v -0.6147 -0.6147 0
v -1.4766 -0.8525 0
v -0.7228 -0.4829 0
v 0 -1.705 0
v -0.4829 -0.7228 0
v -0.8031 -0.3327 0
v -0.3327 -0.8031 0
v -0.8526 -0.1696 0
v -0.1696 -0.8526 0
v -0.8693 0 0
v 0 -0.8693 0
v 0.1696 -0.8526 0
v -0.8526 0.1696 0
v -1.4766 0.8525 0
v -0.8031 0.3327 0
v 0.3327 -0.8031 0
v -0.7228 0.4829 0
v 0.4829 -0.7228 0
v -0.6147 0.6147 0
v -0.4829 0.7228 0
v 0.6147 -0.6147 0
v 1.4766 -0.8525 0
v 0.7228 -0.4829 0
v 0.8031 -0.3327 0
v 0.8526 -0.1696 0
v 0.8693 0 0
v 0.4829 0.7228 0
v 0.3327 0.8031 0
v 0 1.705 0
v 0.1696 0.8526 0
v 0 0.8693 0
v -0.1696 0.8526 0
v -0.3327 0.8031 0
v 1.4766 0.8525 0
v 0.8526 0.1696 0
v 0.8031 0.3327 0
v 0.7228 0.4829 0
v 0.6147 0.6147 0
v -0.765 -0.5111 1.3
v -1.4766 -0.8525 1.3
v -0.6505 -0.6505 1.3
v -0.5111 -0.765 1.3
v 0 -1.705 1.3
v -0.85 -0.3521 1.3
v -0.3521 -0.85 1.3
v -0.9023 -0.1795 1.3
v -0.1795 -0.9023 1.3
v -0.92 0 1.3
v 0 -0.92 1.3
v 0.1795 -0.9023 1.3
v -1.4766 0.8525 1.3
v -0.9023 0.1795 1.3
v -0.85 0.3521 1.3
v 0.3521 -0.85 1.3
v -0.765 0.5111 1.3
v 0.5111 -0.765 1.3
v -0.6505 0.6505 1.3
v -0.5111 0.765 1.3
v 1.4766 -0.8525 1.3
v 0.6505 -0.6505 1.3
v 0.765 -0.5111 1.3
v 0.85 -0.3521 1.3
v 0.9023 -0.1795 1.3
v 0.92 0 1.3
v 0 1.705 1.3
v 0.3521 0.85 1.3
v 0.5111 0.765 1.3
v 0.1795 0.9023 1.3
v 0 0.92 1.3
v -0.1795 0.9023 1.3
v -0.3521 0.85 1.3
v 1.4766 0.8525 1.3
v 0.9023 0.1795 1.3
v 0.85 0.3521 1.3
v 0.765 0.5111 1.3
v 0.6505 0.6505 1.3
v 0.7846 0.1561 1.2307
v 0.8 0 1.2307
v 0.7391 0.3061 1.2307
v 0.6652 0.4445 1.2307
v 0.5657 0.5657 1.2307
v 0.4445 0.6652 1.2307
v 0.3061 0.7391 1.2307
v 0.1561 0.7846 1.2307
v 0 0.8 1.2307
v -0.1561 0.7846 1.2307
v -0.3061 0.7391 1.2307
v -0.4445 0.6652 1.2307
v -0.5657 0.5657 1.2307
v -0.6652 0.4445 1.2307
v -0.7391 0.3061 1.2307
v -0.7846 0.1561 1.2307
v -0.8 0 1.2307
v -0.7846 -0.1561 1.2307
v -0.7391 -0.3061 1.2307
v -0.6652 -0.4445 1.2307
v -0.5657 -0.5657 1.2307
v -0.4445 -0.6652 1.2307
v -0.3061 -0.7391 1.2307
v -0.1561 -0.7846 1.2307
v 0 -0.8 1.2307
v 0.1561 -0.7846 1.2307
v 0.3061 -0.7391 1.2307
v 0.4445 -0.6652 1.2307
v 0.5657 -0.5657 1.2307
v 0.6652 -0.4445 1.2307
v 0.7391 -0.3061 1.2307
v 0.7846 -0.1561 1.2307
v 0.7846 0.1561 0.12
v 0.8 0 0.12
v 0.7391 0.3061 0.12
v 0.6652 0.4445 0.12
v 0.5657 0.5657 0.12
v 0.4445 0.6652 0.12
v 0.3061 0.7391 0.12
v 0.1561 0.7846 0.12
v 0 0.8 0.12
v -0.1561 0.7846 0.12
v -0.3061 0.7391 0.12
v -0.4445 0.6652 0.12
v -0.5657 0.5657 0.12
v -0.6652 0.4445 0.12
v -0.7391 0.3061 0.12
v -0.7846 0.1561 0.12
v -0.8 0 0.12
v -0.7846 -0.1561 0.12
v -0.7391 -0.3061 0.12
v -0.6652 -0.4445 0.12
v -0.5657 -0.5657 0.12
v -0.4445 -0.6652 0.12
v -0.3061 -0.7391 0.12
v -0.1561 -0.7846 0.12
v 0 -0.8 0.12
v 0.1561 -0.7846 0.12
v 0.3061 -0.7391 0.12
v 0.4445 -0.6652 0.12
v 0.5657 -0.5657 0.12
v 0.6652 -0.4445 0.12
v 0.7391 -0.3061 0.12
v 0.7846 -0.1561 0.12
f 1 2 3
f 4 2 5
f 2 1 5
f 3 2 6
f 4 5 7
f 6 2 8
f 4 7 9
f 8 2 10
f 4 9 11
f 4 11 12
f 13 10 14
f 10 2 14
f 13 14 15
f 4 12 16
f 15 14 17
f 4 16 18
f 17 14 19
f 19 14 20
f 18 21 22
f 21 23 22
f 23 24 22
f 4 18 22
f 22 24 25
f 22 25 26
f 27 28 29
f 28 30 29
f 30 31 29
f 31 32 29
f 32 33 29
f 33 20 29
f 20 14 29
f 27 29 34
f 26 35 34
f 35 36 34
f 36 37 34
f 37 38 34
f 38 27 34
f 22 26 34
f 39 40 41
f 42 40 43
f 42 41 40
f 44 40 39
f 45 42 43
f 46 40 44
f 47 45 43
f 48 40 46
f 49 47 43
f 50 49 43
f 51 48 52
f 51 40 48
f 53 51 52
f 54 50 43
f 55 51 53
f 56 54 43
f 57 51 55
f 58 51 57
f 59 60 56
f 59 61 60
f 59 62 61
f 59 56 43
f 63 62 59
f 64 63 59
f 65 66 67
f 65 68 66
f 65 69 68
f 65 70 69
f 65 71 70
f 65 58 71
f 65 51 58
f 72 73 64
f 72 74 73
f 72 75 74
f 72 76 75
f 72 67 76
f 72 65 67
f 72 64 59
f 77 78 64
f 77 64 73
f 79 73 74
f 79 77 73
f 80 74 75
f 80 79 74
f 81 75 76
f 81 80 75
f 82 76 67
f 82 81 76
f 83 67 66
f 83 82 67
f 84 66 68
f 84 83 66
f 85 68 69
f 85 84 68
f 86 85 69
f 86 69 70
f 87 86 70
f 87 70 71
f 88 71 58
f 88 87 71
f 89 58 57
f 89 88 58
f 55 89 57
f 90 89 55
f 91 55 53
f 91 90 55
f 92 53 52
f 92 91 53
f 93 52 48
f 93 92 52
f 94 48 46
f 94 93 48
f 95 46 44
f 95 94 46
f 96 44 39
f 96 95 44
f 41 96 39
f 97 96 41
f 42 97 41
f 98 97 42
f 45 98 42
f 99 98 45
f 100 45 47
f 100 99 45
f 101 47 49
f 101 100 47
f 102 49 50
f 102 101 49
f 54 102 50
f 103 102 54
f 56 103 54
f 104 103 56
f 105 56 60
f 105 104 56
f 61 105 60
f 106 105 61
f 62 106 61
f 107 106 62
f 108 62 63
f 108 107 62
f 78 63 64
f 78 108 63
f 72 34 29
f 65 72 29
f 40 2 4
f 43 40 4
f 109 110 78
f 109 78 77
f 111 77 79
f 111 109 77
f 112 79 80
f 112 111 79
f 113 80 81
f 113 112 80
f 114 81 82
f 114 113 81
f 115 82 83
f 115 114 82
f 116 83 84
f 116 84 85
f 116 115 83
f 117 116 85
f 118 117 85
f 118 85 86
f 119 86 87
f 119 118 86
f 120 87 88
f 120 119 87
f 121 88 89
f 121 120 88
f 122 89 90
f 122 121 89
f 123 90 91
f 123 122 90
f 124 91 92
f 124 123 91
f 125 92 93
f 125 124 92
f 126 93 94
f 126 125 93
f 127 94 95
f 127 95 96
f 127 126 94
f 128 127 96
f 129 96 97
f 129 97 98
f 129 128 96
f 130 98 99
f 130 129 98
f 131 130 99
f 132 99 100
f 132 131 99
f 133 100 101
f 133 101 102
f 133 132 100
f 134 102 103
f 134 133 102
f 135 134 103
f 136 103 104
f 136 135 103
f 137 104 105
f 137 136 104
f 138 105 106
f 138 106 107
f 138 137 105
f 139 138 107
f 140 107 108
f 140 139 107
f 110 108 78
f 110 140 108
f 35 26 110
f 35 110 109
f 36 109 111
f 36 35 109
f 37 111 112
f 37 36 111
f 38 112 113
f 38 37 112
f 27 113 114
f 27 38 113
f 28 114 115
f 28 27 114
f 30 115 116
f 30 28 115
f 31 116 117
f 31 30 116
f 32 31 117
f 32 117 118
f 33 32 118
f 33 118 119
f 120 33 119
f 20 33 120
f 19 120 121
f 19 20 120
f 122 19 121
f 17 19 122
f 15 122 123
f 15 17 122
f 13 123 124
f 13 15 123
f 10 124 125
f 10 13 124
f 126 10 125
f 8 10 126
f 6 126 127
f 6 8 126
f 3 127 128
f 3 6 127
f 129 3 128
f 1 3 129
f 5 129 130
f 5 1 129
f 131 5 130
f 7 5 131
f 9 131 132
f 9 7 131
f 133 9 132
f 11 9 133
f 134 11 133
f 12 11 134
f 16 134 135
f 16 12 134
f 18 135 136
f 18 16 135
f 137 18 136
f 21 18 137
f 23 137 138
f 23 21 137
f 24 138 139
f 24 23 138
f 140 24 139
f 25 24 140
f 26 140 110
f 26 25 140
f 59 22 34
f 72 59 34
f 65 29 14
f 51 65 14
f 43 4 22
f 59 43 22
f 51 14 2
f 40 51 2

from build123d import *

# Parameters (mm, degrees)
SKETCH_1_R             = 0.8
EXTRUDE_1_DEPTH        = 1.3
CHAMFER_1_SIZE         = 0.12
CHAMFER_1_SIZE2        = 0.069282032
CHAMFER_1_PART_2_SIZE  = 0.12
CHAMFER_1_PART_2_SIZE2 = 0.069282032


with BuildPart() as part:
    # Эскиз1 → Бобышка-Вытянуть1 (new body)
    with BuildSketch(Plane.XY):
        Polygon((0, 1.705), (-1.476573313, 0.8525), (-1.476573313, -0.8525), (0, -1.705), (1.476573313, -0.8525), (1.476573313, 0.8525), align=None)
        Circle(SKETCH_1_R, mode=Mode.SUBTRACT)
    extrude(amount=EXTRUDE_1_DEPTH)

    # Фаска1
    chamfer_1_edges = [part.edges().sort_by_distance(p)[0] for p in [
        (-0.8, 0, 0),
    ]]
    chamfer_1_side = [part.faces().sort_by_distance(p)[0] for p in [
        (-0.8, 0, 0.65),
    ]]
    chamfer(chamfer_1_edges, length=CHAMFER_1_SIZE, length2=CHAMFER_1_SIZE2, reference=chamfer_1_side[0])

    # Фаска1 part 2
    chamfer_1_part_2_edges = [part.edges().sort_by_distance(p)[0] for p in [
        (-0.8, 0, 1.3),
    ]]
    chamfer_1_part_2_side = [part.faces().sort_by_distance(p)[0] for p in [
        (-0.715731627, 1.239683542, 1.3),
    ]]
    chamfer(chamfer_1_part_2_edges, length=CHAMFER_1_PART_2_SIZE, length2=CHAMFER_1_PART_2_SIZE2, reference=chamfer_1_part_2_side[0])


solid = part.part
